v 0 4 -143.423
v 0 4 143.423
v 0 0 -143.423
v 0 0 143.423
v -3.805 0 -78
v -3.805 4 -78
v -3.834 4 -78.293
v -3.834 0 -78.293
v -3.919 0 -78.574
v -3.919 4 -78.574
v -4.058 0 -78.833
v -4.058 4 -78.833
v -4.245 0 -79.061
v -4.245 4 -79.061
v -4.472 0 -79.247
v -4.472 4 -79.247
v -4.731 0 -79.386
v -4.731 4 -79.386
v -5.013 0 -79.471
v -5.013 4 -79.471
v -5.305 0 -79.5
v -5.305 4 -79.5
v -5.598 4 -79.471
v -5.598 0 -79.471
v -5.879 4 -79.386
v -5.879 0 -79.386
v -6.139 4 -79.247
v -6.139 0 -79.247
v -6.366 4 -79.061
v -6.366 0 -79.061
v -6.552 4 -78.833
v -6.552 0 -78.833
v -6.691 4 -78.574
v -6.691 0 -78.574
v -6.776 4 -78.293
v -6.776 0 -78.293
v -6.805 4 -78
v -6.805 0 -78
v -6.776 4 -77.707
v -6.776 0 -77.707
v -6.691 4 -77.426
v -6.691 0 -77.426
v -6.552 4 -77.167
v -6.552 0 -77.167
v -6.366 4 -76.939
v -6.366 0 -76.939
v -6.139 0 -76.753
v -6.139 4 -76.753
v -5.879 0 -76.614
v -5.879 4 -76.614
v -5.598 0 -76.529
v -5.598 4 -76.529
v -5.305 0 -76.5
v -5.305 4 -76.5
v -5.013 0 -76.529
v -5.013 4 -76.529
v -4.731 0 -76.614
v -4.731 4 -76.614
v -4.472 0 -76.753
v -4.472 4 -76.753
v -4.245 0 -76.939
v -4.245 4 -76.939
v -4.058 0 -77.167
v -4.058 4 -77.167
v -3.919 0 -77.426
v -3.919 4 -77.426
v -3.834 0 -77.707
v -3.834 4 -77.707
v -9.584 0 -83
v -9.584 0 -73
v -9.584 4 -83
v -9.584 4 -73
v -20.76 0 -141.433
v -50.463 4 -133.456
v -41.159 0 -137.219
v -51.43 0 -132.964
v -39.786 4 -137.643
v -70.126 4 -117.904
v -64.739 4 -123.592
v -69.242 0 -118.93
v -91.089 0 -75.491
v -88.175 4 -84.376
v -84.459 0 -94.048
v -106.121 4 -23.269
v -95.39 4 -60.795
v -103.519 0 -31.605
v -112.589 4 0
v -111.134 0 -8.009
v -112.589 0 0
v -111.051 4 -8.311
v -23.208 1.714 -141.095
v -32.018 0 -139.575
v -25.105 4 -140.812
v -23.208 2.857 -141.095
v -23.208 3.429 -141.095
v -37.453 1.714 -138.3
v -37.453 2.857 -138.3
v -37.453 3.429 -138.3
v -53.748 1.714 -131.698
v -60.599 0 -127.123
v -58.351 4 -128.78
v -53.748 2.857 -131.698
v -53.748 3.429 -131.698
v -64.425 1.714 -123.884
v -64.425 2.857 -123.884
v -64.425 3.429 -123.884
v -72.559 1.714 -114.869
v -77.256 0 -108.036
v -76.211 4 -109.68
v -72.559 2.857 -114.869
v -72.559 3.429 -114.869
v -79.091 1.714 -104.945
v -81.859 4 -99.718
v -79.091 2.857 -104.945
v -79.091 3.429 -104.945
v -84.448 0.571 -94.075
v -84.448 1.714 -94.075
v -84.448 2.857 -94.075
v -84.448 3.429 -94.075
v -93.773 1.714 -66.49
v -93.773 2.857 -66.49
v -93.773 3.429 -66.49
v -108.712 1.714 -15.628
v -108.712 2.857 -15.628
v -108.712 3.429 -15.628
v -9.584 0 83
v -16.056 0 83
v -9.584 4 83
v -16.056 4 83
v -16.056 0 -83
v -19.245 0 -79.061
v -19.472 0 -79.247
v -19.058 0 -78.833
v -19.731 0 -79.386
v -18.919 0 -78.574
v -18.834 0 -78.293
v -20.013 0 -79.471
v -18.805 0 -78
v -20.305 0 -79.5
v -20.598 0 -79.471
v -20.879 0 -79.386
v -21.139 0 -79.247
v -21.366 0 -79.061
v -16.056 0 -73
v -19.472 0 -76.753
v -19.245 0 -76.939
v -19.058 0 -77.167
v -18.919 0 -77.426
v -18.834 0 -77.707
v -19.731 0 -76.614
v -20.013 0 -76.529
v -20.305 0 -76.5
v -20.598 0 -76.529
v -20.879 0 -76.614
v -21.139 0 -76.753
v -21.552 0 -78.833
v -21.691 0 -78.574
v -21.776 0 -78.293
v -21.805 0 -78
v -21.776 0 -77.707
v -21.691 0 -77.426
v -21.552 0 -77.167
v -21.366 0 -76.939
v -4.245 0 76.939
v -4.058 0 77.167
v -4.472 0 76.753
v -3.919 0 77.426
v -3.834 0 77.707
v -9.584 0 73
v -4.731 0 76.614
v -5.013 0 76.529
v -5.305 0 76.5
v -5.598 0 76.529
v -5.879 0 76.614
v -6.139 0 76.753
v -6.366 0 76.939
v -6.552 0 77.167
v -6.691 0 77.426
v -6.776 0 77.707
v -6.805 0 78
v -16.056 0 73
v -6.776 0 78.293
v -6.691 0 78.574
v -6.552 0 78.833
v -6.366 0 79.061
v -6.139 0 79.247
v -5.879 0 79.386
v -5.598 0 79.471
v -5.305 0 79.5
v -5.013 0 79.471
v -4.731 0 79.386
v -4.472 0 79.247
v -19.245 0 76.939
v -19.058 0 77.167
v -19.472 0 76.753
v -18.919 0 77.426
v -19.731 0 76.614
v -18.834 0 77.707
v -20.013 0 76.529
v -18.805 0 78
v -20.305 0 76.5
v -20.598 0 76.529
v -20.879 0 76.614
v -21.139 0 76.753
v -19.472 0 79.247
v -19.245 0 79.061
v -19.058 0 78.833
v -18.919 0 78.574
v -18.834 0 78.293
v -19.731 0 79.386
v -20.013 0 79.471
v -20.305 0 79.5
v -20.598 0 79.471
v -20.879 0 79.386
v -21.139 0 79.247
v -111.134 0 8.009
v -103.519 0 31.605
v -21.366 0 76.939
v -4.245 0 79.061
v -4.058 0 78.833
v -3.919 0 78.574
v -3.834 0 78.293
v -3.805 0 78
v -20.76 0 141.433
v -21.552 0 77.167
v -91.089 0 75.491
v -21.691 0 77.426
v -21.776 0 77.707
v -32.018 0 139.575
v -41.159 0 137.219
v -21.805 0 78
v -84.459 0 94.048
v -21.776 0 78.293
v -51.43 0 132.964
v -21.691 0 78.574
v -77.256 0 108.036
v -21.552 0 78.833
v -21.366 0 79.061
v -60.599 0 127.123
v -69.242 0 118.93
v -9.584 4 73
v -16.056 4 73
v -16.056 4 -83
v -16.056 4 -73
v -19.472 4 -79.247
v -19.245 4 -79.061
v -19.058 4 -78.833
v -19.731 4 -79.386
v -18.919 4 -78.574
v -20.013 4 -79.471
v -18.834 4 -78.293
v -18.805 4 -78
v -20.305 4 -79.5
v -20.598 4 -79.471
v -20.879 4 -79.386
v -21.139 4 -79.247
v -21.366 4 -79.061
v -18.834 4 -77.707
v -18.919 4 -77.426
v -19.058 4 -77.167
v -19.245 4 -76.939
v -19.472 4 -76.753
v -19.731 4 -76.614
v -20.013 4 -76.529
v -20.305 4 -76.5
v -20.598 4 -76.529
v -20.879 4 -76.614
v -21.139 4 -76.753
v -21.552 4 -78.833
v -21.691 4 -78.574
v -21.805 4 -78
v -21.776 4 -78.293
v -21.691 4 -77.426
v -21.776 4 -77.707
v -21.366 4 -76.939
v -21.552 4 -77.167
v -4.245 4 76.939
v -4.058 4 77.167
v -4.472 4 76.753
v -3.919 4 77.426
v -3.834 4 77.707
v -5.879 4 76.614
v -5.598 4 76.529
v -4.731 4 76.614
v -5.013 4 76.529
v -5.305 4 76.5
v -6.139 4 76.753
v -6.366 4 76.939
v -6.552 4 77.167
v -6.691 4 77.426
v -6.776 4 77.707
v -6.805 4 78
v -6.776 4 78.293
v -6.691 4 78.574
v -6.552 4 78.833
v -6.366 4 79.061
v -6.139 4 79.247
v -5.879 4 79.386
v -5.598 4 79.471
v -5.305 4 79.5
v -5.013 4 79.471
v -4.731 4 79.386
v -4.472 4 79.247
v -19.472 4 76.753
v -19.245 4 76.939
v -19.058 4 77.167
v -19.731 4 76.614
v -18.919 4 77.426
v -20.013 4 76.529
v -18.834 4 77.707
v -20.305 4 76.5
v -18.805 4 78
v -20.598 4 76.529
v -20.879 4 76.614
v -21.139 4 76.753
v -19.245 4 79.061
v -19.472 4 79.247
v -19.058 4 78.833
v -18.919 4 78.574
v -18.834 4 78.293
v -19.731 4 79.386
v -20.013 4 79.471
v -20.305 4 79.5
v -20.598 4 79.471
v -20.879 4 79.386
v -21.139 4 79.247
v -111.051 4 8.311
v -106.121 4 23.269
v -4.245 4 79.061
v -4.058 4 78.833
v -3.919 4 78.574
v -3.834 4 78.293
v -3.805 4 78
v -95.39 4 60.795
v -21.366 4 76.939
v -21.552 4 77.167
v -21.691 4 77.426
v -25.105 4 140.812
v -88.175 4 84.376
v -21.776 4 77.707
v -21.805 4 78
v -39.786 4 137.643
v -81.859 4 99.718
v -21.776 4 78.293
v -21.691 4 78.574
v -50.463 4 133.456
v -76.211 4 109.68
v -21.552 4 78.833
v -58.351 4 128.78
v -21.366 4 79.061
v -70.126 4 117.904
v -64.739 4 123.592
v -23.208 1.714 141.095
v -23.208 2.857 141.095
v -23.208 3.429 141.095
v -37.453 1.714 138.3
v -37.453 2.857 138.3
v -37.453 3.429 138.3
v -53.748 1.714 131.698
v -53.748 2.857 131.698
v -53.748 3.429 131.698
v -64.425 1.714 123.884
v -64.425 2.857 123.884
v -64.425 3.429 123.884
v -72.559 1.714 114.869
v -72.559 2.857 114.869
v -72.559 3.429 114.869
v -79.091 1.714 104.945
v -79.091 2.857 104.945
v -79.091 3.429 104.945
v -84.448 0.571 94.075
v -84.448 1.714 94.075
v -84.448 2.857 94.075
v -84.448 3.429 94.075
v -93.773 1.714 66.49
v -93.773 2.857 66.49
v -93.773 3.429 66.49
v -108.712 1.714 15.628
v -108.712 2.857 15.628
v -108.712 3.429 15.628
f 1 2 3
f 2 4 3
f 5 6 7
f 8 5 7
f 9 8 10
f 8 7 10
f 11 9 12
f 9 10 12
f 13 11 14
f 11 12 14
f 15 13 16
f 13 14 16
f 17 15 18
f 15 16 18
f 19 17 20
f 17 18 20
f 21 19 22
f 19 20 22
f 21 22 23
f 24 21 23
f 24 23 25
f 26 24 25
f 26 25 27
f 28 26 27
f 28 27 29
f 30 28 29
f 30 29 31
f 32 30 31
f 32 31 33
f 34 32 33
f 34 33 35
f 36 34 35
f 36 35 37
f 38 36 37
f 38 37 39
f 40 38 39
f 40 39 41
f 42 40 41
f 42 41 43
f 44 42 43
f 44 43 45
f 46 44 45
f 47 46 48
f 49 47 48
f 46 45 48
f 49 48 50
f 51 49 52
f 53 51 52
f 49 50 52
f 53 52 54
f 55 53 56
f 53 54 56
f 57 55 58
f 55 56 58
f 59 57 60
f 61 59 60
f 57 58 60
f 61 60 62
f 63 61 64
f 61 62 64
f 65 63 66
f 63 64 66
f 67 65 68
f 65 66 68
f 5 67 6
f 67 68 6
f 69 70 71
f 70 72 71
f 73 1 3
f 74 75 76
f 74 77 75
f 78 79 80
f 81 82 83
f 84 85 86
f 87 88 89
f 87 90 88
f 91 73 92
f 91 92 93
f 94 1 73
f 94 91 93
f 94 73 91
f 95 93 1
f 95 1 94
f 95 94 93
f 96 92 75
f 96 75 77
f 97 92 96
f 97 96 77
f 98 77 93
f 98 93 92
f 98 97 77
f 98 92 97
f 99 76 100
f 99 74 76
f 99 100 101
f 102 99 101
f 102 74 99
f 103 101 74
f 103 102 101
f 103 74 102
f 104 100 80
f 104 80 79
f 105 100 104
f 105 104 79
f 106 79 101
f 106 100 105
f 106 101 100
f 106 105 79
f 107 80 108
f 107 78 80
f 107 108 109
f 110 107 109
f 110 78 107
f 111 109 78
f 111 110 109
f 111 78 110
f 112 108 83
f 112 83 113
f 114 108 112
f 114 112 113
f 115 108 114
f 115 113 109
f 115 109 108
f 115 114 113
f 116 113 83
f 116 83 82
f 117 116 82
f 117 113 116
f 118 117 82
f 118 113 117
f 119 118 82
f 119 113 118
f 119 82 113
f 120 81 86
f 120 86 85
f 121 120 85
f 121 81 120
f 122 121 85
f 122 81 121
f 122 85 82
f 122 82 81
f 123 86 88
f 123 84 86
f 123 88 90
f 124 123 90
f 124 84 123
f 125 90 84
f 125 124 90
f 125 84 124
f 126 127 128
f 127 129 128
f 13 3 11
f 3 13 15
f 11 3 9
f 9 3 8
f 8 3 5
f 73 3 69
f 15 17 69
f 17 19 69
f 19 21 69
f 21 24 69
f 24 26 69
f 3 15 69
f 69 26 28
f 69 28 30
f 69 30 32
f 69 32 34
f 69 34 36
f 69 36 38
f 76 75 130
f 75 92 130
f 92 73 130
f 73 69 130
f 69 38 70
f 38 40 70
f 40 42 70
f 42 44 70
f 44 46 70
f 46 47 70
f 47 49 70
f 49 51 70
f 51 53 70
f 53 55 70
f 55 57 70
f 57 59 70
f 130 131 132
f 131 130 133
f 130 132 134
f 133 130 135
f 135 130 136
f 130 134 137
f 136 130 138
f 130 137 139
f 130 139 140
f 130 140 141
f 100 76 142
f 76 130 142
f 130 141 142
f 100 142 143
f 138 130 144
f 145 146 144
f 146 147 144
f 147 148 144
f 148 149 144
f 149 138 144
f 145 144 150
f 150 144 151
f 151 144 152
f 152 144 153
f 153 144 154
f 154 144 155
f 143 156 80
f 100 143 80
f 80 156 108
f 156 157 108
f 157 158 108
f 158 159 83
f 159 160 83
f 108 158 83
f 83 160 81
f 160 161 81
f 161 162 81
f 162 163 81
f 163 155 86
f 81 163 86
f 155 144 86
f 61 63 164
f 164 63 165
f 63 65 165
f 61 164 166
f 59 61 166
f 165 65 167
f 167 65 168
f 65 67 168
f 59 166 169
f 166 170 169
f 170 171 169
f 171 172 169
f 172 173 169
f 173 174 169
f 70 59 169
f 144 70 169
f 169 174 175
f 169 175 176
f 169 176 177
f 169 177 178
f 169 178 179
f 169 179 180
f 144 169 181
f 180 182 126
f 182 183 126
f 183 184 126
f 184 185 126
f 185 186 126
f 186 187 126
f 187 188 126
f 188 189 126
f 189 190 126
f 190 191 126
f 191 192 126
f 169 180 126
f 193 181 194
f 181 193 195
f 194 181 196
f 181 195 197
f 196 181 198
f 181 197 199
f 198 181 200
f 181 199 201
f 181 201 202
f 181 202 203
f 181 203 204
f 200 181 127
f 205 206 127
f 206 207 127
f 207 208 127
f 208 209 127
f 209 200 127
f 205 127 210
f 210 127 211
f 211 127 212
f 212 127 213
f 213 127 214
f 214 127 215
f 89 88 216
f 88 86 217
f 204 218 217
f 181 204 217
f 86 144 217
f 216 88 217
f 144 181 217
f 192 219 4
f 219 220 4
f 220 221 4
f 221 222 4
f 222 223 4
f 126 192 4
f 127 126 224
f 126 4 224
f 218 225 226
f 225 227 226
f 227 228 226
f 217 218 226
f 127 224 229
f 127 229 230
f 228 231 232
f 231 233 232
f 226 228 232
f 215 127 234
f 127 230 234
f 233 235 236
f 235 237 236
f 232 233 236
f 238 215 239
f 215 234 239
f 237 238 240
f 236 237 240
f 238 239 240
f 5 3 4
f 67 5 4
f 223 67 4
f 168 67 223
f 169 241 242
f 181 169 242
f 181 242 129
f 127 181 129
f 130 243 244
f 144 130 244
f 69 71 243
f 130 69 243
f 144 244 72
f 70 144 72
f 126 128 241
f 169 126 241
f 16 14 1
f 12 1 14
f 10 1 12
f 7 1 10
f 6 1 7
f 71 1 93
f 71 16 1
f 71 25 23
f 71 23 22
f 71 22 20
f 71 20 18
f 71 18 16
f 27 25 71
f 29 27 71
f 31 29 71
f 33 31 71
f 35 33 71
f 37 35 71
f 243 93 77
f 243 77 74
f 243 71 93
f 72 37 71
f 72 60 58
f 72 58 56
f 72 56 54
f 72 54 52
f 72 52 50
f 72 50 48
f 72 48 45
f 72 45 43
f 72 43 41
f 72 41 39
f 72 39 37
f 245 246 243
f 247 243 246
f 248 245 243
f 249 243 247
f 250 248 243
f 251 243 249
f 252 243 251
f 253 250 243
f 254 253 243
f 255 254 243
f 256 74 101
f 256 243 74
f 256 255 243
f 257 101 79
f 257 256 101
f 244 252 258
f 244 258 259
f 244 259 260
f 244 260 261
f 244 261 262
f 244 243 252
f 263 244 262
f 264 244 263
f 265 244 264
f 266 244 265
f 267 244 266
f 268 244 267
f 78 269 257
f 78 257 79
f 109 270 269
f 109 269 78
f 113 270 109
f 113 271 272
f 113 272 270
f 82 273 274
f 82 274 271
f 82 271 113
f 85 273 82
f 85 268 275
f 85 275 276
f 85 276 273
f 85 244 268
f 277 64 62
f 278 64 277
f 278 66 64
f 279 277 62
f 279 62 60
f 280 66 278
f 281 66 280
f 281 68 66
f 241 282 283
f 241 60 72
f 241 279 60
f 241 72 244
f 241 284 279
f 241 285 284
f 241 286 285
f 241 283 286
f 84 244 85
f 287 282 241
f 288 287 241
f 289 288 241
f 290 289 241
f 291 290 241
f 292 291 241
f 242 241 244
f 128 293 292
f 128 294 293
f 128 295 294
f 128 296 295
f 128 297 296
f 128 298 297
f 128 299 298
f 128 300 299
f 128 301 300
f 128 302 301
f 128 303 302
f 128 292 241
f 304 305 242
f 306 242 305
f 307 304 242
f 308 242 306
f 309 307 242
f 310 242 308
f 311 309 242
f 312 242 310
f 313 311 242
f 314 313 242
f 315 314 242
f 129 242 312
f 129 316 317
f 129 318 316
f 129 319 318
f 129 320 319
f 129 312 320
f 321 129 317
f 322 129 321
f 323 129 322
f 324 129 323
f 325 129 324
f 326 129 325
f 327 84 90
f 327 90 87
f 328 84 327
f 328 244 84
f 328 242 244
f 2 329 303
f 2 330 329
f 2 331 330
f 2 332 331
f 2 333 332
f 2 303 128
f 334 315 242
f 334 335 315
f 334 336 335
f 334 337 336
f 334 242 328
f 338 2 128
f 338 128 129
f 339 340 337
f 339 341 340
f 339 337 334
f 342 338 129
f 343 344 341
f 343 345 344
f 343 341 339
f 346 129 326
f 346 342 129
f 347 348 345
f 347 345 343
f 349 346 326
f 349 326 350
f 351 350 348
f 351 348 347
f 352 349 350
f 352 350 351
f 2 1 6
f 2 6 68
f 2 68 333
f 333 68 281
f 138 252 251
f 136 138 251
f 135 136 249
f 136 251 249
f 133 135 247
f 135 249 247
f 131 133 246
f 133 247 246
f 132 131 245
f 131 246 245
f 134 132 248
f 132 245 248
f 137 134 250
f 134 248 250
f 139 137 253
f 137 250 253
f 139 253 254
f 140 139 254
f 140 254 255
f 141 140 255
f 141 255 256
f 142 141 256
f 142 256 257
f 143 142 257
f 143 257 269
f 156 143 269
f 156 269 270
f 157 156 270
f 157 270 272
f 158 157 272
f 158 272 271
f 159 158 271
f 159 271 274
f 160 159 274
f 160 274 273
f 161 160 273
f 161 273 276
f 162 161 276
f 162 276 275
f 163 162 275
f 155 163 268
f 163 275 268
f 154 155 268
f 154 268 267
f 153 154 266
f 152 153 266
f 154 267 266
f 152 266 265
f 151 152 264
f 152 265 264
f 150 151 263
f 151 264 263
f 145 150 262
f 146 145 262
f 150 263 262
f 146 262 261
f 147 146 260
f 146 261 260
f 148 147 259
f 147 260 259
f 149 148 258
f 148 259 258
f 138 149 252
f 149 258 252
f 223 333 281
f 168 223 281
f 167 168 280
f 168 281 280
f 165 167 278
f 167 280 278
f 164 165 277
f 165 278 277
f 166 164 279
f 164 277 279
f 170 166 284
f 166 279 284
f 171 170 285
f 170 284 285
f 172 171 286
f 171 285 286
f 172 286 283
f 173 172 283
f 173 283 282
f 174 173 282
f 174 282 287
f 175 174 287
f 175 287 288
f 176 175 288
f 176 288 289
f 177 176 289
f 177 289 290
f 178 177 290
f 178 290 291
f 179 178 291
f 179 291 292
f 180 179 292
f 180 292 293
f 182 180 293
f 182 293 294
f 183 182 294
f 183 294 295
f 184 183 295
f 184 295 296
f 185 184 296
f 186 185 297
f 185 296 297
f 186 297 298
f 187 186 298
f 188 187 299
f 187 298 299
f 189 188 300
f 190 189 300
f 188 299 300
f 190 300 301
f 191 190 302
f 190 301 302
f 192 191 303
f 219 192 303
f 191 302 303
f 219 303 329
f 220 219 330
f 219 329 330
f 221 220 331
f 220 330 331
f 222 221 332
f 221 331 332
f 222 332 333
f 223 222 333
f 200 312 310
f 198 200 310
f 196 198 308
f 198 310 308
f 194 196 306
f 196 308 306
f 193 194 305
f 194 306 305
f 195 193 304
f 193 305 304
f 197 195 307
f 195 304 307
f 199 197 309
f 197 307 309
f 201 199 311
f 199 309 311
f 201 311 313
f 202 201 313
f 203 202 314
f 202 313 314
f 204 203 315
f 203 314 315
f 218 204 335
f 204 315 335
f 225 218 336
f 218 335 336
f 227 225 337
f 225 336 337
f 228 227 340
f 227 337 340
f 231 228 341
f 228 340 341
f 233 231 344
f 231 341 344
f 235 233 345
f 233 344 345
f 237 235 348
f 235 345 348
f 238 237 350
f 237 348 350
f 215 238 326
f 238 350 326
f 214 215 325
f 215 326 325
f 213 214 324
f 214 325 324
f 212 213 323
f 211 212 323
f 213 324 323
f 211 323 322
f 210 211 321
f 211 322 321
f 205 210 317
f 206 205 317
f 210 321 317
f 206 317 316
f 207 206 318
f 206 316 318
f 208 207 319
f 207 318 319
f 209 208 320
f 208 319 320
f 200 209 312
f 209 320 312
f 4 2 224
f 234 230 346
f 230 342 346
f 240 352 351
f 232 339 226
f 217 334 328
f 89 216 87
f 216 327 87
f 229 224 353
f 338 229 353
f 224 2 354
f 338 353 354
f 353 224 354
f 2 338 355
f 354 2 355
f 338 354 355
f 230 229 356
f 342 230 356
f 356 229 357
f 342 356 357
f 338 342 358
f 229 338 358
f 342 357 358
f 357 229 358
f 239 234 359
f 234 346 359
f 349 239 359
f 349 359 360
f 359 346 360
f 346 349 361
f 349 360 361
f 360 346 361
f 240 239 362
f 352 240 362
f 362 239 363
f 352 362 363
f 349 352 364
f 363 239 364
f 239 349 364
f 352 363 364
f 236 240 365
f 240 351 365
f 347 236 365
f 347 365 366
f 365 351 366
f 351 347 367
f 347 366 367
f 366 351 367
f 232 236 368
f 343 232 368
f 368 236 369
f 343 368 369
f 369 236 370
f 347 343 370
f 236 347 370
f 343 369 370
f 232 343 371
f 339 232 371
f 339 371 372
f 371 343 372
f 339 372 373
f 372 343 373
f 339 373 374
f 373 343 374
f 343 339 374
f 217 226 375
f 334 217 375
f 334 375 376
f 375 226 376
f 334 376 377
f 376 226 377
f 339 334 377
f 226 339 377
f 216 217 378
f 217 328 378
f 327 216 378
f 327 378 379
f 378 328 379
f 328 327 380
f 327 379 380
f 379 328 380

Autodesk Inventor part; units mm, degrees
sketch "Эскиз1" plane through (0, 0, 0) normal (0, 1, 0) x (-1, 0, 0)
  circle A0 centre (0, 0) radius 165
  line L0 (0, 165) -> (0, -165)
  dimension "d0" = 330
extrude "Выдавливание1" add sketch "Эскиз1" along normal blind 4 contours A0 L0 picked at (44.4959, 32.3282)
sketch "Эскиз2" plane through (0, 4, 0) normal (0, 1, 0) x (1, 0, 0)
  line L0 (0, 0) -> (-113.4659, 0)
  line L1 (0, -165) -> (0, 165) projected
  line L2 (0, -143.423) -> (-29.4077, -141.3803) construction
  line L3 (-29.4077, -141.3803) -> (-49.9234, -135.6119) construction
  line L4 (-49.9234, -135.6119) -> (-65.9786, -125.0595) construction
  line L5 (-65.9786, -125.0595) -> (-80.1797, -105.2669) construction
  line L6 (-80.1797, -105.2669) -> (-89.1079, -84.139) construction
  line L7 (-89.1079, -84.139) -> (-98.5999, -49.2669) construction
  line L8 (-98.5999, -49.2669) -> (-105.5818, -23.0172) construction
  line L9 (-105.5818, -23.0172) -> (-110.6157, -11.1357) construction
  line L10 (-110.6157, -11.1357) -> (-112.257, -3.9988) construction
  line L11 (-112.257, -3.9988) -> (-112.5892, 0) construction
  spline S0 degree 4 poles (0, -143.423) (-29.4077, -141.3803) (-49.9234, -135.6119) (-65.9786, -125.0595) (-80.1797, -105.2669) (-89.1079, -84.139) (-98.5999, -49.2669) (-105.5818, -23.0172) (-110.6157, -11.1357) (-112.257, -3.9988) (-112.5892, 0) knots 1 1 1 1 1 2 3 4 5 6 7 8 8 8 8 8
  line L12 (0, 143.423) -> (-29.4077, 141.3803) construction
  line L13 (-29.4077, 141.3803) -> (-49.9234, 135.6119) construction
  line L14 (-49.9234, 135.6119) -> (-65.9786, 125.0595) construction
  line L15 (-65.9786, 125.0595) -> (-80.1797, 105.2669) construction
  line L16 (-80.1797, 105.2669) -> (-89.1079, 84.139) construction
  line L17 (-89.1079, 84.139) -> (-98.5999, 49.2669) construction
  line L18 (-98.5999, 49.2669) -> (-105.5818, 23.0172) construction
  line L19 (-105.5818, 23.0172) -> (-110.6157, 11.1357) construction
  line L20 (-110.6157, 11.1357) -> (-112.257, 3.9988) construction
  line L21 (-112.257, 3.9988) -> (-112.5892, 0) construction
  spline S1 degree 4 poles (0, 143.423) (-29.4077, 141.3803) (-49.9234, 135.6119) (-65.9786, 125.0595) (-80.1797, 105.2669) (-89.1079, 84.139) (-98.5999, 49.2669) (-105.5818, 23.0172) (-110.6157, 11.1357) (-112.257, 3.9988) (-112.5892, 0) knots 1 1 1 1 1 2 3 4 5 6 7 8 8 8 8 8
  arc A0 (0, 165) -> (0, -165) centre (0, 0) ccw projected
extrude "Выдавливание2" cut sketch "Эскиз2" against normal through all contours S0 L1 A0 S1
sketch "Эскиз6" plane through (0, 4, 0) normal (0, 1, 0) x (1, 0, 0)
  circle A0 centre (-5.3052, -78) radius 1.5 projected
  circle A1 centre (-20.3052, -78) radius 1.5 projected
  line L0 (-16.0562, -73) -> (-16.0562, -83) projected
  line L1 (-9.5837, -73) -> (-16.0562, -73) projected
  line L2 (-9.5837, -83) -> (-9.5837, -73) projected
  line L3 (-16.0562, -83) -> (-9.5837, -83) projected
  point P0 (0, 0)
extrude "Выдавливание6" cut sketch "Эскиз6" against normal through all
mirror "Зеркальное отражение2" about plane through (0, 0, 0) normal (0, 0, 1) of "Выдавливание6"
properties part number "платформа_глаза"
